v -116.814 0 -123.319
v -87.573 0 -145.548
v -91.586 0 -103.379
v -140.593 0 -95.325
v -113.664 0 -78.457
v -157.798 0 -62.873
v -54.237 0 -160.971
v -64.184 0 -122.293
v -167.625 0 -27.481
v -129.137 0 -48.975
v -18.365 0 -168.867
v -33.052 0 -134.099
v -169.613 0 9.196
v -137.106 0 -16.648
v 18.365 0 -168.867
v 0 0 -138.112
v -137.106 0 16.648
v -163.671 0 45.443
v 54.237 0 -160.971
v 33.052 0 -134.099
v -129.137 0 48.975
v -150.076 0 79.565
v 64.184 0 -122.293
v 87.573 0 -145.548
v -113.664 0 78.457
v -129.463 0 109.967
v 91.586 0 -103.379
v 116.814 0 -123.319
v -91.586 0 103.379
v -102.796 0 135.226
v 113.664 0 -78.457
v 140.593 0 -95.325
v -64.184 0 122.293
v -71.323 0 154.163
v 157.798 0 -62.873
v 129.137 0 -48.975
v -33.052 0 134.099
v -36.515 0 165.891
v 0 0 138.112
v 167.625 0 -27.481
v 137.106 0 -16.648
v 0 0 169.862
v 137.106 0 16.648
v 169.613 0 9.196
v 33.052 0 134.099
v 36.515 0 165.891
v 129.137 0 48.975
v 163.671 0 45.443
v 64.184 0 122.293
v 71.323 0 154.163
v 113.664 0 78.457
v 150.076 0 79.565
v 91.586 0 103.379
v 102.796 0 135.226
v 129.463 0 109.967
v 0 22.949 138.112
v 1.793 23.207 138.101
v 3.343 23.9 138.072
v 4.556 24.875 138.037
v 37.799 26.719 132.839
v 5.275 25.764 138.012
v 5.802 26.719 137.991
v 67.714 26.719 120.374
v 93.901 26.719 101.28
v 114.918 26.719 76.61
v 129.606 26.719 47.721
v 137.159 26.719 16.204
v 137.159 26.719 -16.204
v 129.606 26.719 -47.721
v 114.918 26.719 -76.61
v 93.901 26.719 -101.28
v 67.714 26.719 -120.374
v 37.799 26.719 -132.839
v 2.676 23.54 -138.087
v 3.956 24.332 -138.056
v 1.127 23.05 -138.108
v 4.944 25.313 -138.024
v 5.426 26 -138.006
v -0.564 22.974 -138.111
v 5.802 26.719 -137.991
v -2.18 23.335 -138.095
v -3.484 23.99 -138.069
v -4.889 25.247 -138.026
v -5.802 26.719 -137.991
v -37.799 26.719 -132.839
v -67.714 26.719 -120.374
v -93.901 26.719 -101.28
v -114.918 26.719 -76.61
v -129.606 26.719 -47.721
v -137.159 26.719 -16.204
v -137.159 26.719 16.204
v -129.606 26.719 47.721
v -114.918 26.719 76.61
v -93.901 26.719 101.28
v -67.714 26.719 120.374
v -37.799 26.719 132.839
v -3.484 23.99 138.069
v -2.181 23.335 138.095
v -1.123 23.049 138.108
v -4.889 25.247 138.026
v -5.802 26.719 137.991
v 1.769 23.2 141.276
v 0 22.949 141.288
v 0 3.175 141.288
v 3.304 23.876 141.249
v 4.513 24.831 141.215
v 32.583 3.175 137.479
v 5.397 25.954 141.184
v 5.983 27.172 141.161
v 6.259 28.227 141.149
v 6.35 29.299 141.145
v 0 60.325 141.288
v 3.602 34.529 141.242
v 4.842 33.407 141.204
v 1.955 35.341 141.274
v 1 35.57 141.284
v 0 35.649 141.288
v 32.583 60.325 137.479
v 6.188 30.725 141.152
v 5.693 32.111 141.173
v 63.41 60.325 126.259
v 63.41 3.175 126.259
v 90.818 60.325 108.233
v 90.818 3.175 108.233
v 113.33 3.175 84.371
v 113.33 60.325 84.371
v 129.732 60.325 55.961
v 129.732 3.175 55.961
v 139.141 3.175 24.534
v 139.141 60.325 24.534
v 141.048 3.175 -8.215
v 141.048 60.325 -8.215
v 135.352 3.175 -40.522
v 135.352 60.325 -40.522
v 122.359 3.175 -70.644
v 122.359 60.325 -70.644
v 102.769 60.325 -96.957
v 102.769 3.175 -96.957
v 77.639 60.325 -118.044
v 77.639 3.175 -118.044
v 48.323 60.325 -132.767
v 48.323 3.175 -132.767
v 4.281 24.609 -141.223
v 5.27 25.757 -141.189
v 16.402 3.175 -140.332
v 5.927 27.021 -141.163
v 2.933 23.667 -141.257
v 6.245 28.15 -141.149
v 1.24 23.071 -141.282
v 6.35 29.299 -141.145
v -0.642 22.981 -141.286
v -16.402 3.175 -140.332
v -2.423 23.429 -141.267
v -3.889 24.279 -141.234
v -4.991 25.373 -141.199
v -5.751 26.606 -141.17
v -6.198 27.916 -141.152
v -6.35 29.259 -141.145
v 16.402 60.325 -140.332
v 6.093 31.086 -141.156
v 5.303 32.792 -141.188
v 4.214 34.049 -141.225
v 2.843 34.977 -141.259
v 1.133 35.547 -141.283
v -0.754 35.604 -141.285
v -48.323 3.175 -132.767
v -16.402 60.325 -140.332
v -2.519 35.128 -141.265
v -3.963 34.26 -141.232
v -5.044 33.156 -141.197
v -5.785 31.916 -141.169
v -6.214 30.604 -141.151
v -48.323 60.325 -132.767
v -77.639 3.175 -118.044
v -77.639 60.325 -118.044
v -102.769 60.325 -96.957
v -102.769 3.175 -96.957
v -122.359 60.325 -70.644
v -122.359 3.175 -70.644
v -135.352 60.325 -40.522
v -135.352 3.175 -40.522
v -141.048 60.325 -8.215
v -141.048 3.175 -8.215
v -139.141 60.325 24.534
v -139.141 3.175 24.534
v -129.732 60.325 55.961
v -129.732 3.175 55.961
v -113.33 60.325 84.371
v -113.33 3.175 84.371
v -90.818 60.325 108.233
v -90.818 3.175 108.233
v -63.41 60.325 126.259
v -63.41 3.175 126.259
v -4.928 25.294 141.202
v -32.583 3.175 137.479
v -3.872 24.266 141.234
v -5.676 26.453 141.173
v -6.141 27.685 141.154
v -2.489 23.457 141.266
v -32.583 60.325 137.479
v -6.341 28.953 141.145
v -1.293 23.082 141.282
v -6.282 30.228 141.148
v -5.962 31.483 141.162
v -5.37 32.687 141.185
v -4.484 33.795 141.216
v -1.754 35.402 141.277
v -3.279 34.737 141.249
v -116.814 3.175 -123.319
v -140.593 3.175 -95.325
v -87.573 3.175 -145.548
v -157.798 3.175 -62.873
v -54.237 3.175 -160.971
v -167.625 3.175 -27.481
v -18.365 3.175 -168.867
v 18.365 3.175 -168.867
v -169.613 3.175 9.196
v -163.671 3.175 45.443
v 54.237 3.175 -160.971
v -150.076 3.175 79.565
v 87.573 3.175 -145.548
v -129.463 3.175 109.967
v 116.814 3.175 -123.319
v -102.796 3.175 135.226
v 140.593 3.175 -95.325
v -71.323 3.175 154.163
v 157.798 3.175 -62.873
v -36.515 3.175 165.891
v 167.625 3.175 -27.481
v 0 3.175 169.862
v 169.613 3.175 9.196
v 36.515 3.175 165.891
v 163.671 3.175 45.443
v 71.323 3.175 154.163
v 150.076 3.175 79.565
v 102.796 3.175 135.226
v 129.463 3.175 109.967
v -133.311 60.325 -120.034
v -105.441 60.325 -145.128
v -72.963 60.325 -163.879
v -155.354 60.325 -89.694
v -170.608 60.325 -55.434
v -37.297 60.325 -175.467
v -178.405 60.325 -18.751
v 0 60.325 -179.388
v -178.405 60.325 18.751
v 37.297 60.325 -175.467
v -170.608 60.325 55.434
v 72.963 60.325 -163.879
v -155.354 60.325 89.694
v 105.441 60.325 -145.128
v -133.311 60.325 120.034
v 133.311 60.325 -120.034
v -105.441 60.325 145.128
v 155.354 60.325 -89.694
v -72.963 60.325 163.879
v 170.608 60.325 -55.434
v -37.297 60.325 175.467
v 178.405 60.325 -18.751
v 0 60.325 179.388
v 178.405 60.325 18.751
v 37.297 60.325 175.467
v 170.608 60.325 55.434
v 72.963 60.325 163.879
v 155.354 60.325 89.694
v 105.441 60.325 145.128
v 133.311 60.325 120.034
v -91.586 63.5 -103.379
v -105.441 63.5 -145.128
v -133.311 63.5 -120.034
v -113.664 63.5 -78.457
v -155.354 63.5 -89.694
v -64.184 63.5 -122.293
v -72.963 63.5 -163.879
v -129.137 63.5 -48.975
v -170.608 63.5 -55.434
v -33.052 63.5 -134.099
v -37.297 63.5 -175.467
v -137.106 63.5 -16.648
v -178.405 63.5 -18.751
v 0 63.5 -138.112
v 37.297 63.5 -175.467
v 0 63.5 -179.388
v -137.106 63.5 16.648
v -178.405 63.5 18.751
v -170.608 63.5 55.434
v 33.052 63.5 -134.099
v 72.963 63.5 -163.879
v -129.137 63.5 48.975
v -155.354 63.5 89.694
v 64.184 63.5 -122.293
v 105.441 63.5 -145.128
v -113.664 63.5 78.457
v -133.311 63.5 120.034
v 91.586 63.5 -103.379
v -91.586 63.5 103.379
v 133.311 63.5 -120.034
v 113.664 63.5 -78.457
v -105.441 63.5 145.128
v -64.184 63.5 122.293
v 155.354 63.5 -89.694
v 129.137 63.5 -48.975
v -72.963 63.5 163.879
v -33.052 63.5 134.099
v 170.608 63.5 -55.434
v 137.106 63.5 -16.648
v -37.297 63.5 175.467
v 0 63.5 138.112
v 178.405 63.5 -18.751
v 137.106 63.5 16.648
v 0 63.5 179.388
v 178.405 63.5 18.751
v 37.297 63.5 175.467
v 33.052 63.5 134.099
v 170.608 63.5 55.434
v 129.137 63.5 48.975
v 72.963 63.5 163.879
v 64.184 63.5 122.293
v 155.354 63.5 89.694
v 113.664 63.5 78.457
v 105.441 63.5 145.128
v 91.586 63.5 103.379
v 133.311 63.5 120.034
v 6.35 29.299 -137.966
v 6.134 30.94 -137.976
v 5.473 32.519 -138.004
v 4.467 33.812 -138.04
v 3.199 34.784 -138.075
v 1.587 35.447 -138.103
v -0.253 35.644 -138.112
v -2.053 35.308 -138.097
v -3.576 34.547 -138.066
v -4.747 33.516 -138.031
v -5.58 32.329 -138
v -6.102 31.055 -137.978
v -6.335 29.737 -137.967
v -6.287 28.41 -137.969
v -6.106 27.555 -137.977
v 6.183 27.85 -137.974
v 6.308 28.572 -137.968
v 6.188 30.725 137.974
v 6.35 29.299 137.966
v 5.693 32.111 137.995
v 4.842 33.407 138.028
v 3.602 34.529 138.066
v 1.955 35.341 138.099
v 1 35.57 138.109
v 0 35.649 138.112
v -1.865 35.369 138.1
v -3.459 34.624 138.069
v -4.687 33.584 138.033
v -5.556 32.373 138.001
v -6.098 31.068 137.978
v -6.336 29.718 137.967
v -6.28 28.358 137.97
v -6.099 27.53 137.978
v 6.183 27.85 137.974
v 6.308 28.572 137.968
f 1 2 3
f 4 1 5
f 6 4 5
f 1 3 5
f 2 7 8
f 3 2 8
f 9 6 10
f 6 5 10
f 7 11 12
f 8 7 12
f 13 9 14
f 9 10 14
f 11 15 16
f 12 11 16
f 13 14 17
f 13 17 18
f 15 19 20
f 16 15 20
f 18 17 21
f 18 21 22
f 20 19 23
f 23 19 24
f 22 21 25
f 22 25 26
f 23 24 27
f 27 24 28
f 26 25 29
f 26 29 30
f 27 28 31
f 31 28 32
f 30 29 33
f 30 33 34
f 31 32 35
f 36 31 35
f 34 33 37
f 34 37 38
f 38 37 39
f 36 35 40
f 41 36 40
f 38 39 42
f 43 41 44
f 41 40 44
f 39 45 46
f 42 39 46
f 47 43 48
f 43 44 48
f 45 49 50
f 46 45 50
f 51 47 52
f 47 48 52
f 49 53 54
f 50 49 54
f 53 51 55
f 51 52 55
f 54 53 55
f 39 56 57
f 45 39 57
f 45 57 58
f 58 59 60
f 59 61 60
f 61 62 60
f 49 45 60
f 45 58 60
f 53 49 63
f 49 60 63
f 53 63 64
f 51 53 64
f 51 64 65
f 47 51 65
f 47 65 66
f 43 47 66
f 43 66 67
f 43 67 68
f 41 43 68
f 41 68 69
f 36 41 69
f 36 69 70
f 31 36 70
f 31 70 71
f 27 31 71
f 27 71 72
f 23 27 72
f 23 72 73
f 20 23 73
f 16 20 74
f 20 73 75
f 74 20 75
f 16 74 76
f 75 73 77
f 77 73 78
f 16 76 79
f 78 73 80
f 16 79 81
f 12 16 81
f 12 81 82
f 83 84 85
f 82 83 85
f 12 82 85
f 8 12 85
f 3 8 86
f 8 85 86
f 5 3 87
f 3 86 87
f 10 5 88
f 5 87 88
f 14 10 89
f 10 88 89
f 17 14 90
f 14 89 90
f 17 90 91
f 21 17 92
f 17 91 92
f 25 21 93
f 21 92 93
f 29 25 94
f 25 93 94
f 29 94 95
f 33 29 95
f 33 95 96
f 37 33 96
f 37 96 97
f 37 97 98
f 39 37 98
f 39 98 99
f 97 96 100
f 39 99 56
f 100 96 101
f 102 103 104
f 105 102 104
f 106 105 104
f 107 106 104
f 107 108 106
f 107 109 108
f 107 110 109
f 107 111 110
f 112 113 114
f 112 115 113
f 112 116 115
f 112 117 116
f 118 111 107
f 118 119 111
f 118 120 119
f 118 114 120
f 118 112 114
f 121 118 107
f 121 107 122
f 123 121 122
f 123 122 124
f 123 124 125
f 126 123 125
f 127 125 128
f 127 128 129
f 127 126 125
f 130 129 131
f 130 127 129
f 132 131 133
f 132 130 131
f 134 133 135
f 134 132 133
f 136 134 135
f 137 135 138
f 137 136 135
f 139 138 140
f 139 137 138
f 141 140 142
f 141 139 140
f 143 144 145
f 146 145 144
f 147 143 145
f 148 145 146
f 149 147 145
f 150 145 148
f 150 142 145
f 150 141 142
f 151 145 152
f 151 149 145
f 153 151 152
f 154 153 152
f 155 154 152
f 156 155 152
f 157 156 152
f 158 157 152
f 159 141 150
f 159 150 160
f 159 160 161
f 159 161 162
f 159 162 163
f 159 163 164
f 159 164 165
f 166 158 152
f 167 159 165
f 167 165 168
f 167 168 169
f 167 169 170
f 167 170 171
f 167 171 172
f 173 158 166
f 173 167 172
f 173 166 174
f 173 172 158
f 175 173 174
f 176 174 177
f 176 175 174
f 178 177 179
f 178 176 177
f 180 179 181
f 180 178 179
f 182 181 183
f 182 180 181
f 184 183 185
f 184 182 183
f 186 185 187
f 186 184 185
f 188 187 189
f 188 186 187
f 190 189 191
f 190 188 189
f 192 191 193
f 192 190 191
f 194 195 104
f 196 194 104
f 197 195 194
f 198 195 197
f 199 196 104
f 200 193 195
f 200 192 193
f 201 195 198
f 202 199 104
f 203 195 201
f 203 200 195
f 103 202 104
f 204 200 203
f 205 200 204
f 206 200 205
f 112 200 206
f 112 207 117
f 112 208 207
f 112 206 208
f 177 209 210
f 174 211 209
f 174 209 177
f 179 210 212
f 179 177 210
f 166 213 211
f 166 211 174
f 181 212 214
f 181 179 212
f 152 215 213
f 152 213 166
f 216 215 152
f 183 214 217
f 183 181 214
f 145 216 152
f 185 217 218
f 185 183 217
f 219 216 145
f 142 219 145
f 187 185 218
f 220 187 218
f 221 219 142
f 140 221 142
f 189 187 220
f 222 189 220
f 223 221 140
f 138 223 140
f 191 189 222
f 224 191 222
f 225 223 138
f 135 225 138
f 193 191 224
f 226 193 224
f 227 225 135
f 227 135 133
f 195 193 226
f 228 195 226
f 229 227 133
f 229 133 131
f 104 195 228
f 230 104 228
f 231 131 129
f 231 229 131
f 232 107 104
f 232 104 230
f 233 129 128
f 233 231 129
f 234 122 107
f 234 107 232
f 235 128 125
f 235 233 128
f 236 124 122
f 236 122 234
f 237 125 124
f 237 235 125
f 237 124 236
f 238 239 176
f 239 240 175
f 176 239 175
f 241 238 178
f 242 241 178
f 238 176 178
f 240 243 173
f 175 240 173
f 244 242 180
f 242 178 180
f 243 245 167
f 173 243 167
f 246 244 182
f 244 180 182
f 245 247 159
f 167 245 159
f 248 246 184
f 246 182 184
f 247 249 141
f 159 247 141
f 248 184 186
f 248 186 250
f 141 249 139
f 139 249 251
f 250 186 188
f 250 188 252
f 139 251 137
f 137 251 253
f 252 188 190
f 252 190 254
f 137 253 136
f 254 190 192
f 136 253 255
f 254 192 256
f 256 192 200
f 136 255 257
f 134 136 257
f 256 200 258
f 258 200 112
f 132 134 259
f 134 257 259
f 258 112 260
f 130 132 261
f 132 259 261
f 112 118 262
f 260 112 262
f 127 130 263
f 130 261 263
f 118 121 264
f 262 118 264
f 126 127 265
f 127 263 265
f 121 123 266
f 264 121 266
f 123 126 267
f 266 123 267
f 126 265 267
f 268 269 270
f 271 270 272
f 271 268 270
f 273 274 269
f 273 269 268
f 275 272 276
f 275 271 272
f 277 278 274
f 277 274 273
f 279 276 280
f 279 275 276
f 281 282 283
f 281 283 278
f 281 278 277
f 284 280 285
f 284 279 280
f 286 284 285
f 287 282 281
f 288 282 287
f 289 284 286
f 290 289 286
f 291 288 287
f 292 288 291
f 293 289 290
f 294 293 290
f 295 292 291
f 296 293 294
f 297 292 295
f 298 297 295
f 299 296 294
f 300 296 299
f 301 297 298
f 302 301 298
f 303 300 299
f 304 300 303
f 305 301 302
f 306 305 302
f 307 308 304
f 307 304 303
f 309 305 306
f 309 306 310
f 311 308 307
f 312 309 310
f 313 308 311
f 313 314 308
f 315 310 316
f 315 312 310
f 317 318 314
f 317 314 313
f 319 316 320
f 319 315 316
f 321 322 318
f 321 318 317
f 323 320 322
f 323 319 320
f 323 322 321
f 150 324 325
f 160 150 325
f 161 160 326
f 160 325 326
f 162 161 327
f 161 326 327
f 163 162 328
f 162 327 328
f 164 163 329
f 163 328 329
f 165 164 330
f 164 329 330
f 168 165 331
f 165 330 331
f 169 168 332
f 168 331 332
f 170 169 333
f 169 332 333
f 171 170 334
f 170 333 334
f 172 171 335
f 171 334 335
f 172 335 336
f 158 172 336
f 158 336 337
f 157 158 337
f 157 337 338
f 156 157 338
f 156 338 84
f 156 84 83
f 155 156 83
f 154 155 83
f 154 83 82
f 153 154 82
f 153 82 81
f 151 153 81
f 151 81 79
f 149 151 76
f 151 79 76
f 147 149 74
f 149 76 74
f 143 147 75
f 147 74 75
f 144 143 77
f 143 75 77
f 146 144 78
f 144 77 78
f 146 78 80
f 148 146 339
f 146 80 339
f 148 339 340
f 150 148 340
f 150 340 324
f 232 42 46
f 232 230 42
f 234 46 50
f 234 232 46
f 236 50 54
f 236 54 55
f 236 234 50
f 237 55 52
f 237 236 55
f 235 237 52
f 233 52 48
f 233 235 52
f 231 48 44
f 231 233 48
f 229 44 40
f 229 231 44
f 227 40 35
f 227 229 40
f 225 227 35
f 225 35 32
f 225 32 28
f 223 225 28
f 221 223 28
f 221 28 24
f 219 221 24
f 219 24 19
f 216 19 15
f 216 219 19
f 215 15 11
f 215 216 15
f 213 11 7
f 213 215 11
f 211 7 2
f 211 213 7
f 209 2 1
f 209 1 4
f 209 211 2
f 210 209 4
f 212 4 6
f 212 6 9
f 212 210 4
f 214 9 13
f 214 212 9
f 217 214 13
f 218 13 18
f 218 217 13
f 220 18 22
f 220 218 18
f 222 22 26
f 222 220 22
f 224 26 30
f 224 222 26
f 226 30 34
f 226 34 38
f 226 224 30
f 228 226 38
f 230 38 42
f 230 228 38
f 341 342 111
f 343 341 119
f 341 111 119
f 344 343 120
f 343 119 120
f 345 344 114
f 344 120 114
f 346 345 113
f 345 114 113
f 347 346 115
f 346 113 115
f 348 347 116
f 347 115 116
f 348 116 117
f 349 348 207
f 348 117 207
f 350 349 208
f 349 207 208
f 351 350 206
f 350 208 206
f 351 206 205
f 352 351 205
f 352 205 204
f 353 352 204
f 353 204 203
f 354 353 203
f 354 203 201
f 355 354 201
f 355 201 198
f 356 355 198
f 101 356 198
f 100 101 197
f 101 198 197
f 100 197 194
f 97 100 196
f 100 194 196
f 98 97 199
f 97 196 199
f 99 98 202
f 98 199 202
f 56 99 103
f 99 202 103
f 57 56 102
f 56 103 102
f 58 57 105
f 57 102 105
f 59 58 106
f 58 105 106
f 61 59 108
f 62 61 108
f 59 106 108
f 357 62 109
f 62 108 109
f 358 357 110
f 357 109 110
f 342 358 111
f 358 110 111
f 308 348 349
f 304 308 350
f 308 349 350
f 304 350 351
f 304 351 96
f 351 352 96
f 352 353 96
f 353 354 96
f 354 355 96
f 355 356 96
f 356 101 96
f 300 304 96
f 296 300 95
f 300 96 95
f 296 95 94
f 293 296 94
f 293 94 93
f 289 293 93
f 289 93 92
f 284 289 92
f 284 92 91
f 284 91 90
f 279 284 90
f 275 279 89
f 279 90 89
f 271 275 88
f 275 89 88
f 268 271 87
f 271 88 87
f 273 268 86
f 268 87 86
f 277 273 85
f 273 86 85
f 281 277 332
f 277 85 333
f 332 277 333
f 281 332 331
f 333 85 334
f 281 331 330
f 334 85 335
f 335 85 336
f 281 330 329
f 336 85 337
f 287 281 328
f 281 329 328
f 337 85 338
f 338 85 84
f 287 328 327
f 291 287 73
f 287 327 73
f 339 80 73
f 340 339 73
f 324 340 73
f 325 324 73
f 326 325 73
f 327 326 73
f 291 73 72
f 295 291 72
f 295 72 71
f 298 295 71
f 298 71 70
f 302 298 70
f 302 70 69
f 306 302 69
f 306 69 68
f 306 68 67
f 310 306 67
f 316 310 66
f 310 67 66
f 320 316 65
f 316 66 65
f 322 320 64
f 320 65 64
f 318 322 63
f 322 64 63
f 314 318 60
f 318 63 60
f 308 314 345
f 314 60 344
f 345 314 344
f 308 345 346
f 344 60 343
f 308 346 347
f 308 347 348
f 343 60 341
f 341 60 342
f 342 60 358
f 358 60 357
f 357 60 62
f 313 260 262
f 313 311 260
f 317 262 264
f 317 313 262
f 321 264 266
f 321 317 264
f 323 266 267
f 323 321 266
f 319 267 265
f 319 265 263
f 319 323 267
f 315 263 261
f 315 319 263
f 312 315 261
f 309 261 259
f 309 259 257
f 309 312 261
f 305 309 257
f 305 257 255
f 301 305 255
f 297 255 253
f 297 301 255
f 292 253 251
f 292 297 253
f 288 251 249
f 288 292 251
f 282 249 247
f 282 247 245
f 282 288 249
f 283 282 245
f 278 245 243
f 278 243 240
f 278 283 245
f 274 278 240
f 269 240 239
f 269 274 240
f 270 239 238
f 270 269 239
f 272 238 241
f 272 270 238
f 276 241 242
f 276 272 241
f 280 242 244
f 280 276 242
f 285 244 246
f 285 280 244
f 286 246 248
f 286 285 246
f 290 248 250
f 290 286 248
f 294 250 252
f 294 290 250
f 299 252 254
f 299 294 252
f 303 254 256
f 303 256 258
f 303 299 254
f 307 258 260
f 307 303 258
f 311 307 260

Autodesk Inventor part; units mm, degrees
ref_plane "YZ Plane" through (0, 0, 0) normal (1, 0, 0) x (0, 1, 0)
ref_plane "XZ Plane" through (0, 0, 0) normal (0, 1, 0) x (-1, 0, 0)
ref_plane "XY Plane" through (0, 0, 0) normal (0, 0, 1) x (1, 0, 0)
sketch "Sketch1" plane through (0, 0, 0) normal (1, 0, 0) x (0, 1, 0)
  line L0 (0, 0) -> (50.8, 0)
  line L1 (0, 138.1125) -> (26.719, 138.1125)
  line L2 (0, 138.1125) -> (0, 169.8625)
  line L3 (0, 169.8625) -> (3.175, 169.8625)
  line L4 (3.175, 169.8625) -> (3.175, 141.2875)
  line L5 (3.175, 141.2875) -> (60.325, 141.2875)
  line L6 (60.325, 141.2875) -> (60.325, 179.3875)
  line L7 (60.325, 179.3875) -> (63.5, 179.3875)
  line L8 (63.5, 179.3875) -> (63.5, 138.1125)
  line L9 (63.5, 138.1125) -> (26.719, 138.1125)
  point P0 (62.1333, 179.3875)
  dimension "d0" = 50.8
  dimension "d1" = 138.1125
  dimension "d2" = 31.75
  dimension "d3" = 3.175
  dimension "d4" = 3.175
  dimension "d5" = 57.15
  dimension "d6" = 38.1
  dimension "d7" = 3.175
revolve "Revolution1" add sketch "Sketch1" angle 360 about axis through (0, 0, 0) along (0, 1, 0)
ref_plane "Work Plane1" through (0, 62.1333, 179.3875) normal (0, 0, 1) x (1, 0, 0)
sketch "Sketch2" plane through (0, 62.1333, 179.3875) normal (0, 0, 1) x (1, 0, 0)
  circle A0 centre (0, -32.8344) radius 6.35
  line L0 (169.8625, -58.9583) -> (-169.8625, -58.9583) projected
  point P0 (0, -62.1333)
  dimension "d9" = 12.7
  dimension "d10" = 26.1239
extrude "Extrusion1" cut sketch "Sketch2" against normal through all
properties part number "Layer2_Ref"
